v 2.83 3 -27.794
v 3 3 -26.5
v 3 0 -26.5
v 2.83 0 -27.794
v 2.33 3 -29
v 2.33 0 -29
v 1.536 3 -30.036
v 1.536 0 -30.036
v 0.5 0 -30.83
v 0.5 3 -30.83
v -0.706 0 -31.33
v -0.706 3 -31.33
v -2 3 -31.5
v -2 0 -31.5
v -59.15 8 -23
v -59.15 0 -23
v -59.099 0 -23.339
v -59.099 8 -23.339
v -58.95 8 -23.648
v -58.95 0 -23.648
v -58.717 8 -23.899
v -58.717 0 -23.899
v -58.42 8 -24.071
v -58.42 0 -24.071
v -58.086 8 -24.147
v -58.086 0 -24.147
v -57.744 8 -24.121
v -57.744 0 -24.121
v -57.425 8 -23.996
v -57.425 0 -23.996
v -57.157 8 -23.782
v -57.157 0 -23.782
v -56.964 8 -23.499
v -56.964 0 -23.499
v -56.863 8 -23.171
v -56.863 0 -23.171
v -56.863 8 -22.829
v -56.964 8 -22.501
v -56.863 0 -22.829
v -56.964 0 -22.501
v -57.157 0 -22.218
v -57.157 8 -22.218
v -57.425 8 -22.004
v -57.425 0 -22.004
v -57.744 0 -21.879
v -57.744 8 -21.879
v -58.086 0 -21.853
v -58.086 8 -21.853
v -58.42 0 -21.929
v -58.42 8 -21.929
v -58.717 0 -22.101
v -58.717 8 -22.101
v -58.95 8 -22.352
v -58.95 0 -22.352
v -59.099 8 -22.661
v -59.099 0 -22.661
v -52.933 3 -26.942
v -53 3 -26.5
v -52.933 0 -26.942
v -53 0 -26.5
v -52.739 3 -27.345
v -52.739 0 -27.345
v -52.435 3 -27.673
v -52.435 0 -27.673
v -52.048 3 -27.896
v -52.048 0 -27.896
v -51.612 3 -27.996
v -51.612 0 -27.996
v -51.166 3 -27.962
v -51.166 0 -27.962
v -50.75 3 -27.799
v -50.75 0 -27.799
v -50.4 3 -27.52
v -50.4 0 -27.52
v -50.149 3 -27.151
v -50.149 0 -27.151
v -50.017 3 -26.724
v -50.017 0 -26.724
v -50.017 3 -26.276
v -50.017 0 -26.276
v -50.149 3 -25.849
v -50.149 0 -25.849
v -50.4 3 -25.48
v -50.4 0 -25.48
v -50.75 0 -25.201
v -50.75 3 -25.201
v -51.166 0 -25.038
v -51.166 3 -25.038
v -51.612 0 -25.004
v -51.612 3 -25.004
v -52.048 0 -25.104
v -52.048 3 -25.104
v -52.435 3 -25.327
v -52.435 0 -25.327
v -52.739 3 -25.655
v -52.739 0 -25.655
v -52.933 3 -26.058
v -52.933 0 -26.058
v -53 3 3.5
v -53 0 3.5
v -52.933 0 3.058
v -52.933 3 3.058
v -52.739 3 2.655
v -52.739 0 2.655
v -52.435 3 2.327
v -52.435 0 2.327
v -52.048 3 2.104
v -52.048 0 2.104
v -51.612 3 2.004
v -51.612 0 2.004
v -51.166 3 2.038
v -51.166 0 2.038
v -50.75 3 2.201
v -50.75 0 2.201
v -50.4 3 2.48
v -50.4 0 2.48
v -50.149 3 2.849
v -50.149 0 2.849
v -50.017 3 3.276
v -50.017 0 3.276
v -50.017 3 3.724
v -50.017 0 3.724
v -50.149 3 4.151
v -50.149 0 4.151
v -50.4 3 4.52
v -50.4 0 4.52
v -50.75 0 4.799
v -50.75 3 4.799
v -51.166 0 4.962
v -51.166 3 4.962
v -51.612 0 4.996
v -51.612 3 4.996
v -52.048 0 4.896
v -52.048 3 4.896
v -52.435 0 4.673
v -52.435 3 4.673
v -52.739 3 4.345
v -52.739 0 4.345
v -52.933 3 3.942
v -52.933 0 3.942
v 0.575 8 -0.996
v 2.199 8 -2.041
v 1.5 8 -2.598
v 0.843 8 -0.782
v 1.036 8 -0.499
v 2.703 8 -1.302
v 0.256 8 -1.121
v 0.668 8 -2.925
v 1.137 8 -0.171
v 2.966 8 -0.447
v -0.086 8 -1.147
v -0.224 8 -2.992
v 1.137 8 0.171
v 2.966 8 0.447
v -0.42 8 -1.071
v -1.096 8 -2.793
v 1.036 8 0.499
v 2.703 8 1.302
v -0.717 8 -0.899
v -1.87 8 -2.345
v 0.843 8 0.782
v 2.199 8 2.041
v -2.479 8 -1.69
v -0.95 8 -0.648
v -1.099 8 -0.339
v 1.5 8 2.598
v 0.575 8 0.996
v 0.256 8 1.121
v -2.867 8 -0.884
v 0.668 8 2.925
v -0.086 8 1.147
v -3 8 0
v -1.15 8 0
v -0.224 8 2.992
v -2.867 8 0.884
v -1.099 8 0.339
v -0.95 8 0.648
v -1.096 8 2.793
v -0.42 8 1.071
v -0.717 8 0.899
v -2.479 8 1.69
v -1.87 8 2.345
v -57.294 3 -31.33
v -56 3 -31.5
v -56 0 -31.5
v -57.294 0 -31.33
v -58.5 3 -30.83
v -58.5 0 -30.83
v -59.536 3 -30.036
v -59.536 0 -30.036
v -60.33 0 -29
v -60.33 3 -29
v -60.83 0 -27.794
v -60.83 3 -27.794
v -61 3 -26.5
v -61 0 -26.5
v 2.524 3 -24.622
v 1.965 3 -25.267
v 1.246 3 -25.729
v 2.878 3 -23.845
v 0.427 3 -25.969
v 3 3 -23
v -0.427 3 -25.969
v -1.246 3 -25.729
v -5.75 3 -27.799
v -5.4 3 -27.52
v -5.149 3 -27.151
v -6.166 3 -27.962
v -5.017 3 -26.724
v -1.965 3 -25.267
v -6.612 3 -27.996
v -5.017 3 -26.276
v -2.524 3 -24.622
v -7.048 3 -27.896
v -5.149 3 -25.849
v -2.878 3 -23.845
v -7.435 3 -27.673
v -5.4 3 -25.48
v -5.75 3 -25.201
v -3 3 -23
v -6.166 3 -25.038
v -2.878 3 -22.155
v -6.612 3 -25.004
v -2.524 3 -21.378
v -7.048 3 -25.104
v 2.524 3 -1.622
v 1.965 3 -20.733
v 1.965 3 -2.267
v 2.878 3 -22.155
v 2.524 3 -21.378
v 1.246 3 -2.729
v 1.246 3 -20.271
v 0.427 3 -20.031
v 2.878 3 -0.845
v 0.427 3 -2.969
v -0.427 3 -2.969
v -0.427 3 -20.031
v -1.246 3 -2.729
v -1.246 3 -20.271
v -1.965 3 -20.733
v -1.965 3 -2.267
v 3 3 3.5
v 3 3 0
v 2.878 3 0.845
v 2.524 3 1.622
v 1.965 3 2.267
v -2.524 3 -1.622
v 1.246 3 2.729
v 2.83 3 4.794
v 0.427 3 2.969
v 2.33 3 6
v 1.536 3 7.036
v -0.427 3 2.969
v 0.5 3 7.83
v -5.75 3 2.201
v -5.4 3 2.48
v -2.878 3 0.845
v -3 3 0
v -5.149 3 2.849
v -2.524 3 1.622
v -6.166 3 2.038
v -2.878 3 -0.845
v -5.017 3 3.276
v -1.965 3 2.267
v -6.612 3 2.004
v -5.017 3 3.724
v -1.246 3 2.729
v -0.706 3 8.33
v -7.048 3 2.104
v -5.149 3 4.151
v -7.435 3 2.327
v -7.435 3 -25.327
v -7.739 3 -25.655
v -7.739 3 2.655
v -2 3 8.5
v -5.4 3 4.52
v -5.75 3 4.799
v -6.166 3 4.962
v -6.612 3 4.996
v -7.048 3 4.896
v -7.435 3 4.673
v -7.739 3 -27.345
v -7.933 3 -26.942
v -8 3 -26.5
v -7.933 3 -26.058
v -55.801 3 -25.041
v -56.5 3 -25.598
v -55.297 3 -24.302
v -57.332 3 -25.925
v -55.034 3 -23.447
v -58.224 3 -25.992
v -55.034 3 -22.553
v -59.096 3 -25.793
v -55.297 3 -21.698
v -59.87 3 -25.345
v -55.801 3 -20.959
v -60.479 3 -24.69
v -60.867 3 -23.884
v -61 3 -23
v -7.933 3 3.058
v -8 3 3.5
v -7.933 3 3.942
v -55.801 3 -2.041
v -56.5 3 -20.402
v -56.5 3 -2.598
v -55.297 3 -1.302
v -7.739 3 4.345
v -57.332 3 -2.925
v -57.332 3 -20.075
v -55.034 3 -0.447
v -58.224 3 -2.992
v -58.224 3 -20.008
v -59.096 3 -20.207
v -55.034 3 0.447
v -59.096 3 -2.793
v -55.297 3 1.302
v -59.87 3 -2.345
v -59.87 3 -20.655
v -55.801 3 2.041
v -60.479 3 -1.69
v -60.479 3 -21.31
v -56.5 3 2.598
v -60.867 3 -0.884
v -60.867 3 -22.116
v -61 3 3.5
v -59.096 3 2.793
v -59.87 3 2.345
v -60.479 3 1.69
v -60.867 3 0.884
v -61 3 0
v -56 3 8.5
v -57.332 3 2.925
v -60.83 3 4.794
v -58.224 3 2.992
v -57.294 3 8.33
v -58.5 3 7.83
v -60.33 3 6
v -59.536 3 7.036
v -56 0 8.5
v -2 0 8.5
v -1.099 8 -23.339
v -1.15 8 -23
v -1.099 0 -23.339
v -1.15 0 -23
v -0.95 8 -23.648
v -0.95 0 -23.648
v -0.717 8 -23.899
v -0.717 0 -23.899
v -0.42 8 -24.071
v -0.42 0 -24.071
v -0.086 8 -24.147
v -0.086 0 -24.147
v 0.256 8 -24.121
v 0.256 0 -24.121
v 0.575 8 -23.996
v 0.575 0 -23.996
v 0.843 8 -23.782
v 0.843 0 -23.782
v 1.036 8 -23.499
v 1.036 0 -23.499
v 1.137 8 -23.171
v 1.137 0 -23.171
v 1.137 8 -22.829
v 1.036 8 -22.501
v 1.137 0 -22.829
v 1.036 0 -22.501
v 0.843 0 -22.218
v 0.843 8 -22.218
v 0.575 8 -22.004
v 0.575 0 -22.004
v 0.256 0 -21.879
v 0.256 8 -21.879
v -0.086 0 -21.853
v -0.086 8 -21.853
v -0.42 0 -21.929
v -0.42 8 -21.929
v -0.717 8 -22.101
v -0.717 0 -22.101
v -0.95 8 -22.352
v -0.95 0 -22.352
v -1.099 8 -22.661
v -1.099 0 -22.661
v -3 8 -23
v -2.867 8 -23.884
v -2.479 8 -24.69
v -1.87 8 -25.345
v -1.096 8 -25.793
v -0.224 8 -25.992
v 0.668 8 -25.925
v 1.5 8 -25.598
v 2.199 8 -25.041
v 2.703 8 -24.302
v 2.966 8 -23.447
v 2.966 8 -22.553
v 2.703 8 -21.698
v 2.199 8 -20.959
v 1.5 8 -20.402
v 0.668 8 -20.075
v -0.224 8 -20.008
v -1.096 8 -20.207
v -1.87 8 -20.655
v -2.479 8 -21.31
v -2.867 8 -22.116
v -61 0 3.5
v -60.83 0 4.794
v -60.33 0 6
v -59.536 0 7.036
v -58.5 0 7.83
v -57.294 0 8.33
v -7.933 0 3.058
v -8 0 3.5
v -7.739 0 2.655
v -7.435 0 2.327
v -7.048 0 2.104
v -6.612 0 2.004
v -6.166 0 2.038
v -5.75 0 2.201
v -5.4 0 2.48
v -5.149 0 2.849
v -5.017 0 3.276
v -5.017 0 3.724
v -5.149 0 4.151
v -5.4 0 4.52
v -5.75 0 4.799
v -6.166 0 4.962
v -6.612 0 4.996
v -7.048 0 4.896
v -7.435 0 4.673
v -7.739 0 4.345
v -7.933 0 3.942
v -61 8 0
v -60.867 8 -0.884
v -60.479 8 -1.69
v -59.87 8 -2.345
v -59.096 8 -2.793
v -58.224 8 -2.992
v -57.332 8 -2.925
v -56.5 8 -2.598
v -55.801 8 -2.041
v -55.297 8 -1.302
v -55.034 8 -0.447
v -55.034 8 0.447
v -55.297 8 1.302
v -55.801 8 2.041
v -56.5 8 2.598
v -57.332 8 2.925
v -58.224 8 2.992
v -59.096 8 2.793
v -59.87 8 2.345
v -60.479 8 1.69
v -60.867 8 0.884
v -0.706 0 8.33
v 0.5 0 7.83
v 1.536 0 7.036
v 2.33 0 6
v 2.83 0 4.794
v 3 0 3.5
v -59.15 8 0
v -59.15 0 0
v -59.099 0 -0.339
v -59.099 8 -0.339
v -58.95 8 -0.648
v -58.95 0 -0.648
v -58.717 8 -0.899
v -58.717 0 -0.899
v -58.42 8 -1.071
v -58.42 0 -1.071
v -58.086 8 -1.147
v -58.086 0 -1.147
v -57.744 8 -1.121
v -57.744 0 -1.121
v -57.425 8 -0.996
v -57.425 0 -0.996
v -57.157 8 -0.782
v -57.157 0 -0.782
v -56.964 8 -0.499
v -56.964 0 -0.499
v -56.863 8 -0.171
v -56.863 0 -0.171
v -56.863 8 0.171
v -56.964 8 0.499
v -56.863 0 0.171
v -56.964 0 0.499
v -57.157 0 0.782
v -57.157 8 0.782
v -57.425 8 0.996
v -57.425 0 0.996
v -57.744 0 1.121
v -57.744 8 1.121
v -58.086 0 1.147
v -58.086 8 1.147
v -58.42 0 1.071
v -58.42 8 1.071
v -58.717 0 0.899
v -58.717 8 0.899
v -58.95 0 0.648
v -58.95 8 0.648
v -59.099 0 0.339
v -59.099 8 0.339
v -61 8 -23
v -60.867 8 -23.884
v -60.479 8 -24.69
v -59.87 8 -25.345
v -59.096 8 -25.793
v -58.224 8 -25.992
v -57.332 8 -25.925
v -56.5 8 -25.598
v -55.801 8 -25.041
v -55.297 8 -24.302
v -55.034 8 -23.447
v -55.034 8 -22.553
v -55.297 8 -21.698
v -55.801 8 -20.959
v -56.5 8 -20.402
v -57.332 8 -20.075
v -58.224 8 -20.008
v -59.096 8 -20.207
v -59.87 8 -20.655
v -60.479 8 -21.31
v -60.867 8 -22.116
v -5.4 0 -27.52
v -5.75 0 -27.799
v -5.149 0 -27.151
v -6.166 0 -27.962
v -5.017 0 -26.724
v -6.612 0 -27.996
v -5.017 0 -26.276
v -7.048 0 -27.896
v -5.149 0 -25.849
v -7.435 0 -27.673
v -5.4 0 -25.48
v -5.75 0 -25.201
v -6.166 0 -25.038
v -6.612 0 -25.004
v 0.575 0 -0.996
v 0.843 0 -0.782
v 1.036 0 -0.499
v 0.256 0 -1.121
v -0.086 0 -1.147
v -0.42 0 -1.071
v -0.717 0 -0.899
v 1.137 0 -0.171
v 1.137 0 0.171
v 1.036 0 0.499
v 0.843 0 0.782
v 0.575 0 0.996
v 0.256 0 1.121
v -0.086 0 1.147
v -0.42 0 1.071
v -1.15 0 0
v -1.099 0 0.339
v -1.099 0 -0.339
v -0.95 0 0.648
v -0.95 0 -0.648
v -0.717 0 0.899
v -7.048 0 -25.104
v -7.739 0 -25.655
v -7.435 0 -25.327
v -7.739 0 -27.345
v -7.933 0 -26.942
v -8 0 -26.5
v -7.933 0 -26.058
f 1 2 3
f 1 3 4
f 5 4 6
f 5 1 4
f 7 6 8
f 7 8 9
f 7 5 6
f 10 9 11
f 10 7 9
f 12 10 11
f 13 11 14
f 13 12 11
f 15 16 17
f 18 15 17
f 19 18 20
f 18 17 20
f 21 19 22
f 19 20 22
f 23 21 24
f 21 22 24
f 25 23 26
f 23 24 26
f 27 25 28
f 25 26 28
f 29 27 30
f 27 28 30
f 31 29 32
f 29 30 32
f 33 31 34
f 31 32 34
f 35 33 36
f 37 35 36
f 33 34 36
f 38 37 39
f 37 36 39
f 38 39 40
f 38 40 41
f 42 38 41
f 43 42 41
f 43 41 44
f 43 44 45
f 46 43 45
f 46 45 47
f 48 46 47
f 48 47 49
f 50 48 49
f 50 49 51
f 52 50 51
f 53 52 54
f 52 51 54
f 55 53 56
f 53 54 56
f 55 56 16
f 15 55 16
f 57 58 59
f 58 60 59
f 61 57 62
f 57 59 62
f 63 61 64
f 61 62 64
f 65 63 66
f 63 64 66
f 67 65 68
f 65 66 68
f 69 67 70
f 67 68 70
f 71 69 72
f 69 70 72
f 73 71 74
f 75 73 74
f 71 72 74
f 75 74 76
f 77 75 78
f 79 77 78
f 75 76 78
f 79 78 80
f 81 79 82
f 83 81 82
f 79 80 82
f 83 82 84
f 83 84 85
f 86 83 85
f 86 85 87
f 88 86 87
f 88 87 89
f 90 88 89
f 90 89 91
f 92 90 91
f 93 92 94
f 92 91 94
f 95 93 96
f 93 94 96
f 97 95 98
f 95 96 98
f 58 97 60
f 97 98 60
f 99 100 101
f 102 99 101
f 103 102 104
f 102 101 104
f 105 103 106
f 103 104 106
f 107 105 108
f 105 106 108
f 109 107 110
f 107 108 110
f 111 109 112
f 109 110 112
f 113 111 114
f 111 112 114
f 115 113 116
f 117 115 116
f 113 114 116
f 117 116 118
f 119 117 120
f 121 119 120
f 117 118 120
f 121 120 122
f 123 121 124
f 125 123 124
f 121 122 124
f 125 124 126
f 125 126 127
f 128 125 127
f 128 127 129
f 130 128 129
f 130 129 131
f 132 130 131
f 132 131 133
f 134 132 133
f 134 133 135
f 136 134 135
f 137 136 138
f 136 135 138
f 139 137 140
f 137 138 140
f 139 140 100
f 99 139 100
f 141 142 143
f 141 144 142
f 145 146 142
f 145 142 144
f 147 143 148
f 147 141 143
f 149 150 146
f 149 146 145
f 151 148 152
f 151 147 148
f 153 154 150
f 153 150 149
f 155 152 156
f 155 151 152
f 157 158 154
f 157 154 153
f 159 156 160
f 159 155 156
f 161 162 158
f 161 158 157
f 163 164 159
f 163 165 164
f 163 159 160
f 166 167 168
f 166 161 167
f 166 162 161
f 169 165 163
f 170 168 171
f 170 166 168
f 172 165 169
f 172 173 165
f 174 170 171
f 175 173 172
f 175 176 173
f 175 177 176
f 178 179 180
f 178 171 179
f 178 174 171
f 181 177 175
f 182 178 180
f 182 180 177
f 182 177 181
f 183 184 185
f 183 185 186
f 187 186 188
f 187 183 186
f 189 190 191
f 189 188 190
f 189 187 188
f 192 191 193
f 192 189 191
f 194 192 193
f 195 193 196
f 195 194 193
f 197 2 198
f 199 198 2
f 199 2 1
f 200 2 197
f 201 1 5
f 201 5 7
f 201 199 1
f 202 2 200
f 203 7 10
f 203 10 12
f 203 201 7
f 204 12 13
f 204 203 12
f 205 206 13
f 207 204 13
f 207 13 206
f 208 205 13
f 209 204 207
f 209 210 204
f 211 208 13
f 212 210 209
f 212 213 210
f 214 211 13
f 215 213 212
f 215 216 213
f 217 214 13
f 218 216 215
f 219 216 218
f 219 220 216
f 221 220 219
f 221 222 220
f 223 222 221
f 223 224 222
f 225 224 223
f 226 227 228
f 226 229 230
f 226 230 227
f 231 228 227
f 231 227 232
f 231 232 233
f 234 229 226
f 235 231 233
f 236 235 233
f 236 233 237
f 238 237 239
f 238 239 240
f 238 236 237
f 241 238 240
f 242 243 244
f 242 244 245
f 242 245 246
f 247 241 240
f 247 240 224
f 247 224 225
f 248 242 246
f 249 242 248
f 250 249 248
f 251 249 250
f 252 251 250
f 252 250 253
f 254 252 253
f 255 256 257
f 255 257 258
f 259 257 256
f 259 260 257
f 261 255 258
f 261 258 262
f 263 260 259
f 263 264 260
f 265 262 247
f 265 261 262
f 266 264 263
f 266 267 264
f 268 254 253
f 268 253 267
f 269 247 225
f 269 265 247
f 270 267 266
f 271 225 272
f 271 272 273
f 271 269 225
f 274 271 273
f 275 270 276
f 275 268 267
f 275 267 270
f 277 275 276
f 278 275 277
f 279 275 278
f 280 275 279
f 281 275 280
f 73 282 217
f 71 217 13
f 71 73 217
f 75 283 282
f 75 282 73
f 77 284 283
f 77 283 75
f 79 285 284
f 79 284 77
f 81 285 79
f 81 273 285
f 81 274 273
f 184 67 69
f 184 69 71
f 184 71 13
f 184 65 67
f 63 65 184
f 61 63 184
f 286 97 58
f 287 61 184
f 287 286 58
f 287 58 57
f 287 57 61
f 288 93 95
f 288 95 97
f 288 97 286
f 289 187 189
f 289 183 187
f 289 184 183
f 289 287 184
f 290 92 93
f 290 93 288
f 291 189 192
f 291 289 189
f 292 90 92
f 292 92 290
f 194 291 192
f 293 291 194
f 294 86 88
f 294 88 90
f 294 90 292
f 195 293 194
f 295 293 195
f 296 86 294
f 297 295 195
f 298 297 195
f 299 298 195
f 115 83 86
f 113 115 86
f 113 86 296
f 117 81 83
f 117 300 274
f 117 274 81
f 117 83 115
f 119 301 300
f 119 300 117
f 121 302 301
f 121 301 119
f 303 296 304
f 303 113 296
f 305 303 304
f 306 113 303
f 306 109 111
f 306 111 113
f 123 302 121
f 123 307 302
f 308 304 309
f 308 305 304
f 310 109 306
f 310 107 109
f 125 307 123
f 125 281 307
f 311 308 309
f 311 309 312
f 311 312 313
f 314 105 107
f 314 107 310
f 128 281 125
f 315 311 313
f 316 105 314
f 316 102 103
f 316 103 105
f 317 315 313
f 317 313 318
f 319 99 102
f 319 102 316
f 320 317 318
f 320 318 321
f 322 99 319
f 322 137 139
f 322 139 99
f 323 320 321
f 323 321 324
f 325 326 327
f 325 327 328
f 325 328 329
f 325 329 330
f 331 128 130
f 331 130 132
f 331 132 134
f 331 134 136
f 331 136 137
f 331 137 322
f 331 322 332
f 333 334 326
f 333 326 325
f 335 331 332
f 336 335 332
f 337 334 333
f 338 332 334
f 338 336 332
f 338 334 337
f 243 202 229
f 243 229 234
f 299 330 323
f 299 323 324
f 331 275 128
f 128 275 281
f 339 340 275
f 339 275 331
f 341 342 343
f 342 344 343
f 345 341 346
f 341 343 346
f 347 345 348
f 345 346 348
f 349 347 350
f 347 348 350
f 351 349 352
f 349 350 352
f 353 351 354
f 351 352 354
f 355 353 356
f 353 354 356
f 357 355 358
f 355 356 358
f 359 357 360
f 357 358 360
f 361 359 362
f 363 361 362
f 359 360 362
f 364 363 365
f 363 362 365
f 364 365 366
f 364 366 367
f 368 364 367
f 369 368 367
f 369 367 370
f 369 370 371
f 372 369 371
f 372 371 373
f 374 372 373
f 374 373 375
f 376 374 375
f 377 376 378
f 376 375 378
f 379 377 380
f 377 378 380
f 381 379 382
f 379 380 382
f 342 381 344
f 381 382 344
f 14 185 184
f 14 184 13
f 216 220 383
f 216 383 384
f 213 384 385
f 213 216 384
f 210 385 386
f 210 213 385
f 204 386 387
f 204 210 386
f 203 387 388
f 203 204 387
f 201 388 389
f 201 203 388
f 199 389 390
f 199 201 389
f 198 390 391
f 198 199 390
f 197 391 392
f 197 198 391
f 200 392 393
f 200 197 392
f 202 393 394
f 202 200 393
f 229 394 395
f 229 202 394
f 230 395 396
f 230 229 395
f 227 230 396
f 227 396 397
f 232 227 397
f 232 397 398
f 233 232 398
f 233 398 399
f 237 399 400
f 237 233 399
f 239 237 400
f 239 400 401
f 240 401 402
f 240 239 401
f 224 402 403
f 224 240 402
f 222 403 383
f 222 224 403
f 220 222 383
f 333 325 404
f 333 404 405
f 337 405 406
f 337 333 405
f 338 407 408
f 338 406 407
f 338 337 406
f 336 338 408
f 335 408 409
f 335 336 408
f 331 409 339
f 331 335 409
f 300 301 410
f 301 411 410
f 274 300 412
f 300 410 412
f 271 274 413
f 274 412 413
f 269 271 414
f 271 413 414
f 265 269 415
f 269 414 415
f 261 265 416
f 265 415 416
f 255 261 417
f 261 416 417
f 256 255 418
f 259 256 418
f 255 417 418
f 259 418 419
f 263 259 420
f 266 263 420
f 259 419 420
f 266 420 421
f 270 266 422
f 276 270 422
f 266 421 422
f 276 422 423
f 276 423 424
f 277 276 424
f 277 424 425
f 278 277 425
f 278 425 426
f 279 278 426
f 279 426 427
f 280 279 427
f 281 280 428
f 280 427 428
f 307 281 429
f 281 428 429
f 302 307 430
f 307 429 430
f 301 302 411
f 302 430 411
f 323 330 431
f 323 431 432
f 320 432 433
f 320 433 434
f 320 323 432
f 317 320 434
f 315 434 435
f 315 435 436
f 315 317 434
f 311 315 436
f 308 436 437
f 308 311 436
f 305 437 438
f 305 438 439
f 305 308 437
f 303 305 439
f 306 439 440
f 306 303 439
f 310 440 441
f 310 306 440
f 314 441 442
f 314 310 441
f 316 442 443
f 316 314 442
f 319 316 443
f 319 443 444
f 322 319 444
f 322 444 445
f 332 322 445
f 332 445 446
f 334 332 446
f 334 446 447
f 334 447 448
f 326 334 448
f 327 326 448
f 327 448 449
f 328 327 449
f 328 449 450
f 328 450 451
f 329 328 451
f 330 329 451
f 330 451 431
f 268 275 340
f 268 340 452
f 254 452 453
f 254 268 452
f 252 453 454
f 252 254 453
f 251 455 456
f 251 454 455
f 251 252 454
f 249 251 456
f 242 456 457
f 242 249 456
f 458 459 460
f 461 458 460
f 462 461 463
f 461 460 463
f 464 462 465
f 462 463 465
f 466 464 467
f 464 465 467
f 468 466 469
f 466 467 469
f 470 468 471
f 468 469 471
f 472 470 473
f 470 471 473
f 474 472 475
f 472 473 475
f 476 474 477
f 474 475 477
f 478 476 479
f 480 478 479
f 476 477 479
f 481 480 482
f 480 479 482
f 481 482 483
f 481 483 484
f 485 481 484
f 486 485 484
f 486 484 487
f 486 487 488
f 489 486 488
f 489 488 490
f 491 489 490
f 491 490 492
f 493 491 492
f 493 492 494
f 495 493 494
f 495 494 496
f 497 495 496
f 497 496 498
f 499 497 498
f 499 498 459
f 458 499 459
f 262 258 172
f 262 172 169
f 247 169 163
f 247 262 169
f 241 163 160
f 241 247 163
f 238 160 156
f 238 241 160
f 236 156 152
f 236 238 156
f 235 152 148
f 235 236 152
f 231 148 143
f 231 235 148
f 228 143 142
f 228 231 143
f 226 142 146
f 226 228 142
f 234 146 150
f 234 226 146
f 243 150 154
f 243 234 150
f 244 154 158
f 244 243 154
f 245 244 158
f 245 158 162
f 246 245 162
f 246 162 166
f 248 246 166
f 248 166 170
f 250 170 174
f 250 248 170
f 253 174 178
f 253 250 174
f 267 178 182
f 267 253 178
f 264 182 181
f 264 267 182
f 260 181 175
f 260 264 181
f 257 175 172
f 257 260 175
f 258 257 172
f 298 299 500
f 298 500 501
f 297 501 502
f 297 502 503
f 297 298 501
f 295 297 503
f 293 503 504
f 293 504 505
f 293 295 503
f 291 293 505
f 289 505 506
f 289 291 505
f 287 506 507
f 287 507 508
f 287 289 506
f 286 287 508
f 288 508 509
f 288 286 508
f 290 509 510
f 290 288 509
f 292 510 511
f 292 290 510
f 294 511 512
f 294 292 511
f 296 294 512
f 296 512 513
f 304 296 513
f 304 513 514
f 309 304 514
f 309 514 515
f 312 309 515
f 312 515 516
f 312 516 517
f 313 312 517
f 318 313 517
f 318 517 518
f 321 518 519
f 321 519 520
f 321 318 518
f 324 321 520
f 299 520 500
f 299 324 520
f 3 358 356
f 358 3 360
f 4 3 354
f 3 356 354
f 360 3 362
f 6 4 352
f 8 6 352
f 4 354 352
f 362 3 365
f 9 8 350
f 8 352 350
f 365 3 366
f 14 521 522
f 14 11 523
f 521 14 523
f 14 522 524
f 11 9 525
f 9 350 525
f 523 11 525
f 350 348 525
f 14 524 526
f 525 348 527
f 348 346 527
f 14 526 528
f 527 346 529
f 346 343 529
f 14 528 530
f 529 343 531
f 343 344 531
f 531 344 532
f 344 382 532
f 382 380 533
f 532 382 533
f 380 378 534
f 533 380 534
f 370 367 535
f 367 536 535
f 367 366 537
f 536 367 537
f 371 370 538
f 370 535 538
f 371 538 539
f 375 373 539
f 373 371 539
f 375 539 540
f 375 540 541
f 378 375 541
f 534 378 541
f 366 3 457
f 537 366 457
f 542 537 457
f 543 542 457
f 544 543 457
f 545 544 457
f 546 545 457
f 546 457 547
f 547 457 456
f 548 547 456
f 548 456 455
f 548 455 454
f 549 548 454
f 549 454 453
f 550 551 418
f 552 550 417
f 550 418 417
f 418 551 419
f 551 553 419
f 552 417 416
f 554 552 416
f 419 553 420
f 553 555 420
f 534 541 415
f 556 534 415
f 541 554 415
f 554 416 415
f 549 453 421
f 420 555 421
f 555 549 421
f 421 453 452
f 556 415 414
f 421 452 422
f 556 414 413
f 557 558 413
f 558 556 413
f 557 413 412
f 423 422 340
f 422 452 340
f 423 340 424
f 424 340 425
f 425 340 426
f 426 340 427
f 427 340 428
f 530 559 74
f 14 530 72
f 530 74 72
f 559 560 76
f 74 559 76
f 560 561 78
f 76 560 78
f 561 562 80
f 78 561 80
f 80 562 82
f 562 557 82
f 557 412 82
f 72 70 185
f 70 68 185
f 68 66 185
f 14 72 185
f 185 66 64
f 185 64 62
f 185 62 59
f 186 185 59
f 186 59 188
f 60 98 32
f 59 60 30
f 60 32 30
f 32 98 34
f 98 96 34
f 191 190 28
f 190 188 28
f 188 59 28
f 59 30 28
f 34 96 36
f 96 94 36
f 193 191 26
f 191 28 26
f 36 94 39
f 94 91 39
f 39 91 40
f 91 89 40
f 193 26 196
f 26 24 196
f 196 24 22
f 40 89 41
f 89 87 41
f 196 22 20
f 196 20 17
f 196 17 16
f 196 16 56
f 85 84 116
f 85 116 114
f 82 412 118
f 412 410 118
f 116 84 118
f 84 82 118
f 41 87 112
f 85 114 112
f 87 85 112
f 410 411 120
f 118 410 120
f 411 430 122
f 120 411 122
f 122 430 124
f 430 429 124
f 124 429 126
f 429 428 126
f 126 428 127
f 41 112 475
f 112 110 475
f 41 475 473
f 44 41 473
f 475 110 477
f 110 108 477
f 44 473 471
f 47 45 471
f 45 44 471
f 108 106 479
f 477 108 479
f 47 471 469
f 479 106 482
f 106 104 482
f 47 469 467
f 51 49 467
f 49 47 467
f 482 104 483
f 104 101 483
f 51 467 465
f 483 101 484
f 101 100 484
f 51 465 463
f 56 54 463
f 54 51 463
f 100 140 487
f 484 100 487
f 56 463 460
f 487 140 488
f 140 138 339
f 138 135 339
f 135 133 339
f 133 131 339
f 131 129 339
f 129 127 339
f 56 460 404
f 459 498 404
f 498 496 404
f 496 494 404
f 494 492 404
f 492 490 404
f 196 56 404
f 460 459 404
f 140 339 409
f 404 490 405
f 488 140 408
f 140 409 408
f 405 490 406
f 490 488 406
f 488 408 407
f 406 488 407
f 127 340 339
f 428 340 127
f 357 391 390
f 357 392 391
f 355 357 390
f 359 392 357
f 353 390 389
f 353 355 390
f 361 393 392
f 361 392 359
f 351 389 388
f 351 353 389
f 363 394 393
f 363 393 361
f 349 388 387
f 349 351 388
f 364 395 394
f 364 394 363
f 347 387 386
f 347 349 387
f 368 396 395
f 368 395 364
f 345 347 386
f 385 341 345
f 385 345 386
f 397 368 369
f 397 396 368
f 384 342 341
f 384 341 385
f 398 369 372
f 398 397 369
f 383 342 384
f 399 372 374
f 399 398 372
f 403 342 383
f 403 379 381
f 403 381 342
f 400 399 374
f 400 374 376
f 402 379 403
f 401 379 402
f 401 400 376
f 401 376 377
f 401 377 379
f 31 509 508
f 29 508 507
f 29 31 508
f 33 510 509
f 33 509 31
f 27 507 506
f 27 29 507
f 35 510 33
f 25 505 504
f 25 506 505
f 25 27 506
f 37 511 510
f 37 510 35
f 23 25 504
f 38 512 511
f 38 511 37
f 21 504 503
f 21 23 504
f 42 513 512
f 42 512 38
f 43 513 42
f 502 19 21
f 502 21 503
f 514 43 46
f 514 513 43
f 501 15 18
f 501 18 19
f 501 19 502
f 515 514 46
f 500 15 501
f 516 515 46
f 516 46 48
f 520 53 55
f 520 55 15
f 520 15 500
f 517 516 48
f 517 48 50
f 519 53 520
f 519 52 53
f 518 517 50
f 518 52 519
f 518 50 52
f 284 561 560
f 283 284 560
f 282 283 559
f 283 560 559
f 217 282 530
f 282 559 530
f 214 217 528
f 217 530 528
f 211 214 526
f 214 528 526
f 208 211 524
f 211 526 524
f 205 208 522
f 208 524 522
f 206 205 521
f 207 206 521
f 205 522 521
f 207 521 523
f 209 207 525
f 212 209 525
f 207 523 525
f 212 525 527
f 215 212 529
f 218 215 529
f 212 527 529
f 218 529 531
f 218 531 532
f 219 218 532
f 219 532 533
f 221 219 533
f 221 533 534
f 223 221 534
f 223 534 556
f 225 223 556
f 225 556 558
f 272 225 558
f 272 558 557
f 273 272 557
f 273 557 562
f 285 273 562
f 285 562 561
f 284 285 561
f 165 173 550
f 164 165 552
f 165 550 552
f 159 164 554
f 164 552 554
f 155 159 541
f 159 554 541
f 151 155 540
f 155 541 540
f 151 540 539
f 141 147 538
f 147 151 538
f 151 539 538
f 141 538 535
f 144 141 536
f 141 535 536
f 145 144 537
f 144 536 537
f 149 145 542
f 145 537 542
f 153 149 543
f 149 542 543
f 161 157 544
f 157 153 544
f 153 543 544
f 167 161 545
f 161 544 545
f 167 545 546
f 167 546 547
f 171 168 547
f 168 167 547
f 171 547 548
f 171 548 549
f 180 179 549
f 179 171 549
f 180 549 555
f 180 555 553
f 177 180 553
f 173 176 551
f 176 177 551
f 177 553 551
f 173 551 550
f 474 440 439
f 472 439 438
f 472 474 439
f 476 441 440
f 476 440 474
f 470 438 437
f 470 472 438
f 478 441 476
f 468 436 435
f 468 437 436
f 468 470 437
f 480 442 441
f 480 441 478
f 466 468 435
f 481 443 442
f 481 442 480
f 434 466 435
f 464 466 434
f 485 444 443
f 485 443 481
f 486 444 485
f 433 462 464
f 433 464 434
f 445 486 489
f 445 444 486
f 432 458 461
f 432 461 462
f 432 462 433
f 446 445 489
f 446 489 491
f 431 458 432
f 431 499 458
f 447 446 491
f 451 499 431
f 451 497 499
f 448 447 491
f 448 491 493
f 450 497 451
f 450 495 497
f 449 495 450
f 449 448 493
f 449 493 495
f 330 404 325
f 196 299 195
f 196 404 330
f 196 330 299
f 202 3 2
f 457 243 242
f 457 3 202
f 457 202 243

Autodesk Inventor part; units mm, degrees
ref_plane "YZ Plane" through (0, 0, 0) normal (1, 0, 0) x (0, 1, 0)
ref_plane "XZ Plane" through (0, 0, 0) normal (0, 1, 0) x (-1, 0, 0)
ref_plane "XY Plane" through (0, 0, 0) normal (0, 0, 1) x (1, 0, 0)
sketch "Sketch1" plane through (0, 0, 0) normal (0, 1, 0) x (-1, 0, 0)
  line L0 (0, 0) -> (58, 0)
  line L1 (58, 0) -> (58, -23)
  line L2 (58, -23) -> (0, -23)
  line L3 (0, -23) -> (0, 0)
  line L4 (6.5, 3.5) -> (51.5, 3.5)
  line L5 (51.5, 3.5) -> (51.5, -26.5)
  line L6 (51.5, -26.5) -> (6.5, -26.5)
  line L7 (6.5, -26.5) -> (6.5, 3.5)
  circle A0 centre (51.5, 3.5) radius 1.5
  circle A1 centre (51.5, -26.5) radius 1.5
  circle A2 centre (6.5, -26.5) radius 1.5
  circle A3 centre (6.5, 3.5) radius 1.5
  line L8 (-3, 8.5) -> (61, 8.5)
  line L9 (61, 8.5) -> (61, -31.5)
  line L10 (61, -31.5) -> (-3, -31.5)
  line L11 (-3, -31.5) -> (-3, 8.5)
  circle A4 centre (58, 0) radius 1.15
  circle A5 centre (58, -23) radius 1.15
  circle A6 centre (0, 0) radius 1.15
  circle A7 centre (0, -23) radius 1.15
  circle A8 centre (58, 0) radius 3
  circle A9 centre (58, -23) radius 3
  circle A10 centre (0, 0) radius 3
  circle A11 centre (0, -23) radius 3
  dimension "d0" = 23
  dimension "d1" = 58
  dimension "d2" = 45
  dimension "d3" = 30
  dimension "d4" = 3.5
  dimension "d6" = 3
  dimension "d7" = 3
  dimension "d8" = 3
  dimension "d9" = 3
  dimension "d10" = 9.5
  dimension "d11" = 5
  dimension "d12" = 5
  dimension "d13" = 9.5
  dimension "d14" = 2.3
  dimension "d15" = 2.3
  dimension "d16" = 2.3
  dimension "d17" = 2.3
  dimension "d18" = 6
  dimension "d19" = 6
  dimension "d20" = 6
  dimension "d21" = 6
  dimension "d28" = 6.5
extrude "Extrusion1" add sketch "Sketch1" along normal blind 3 contours A6 L3 A10 L0 | L0 A10 L3 A6 | A10 L11 L8 L9 A8 L0 L5 A0 L4 A3 L7 | L0 L7 L2 A11 L3 A10 | L3 A11 L11 A10 | L7 A3 L4 A0 L5 L0 | L0 L5 L2 L7 | A11 L2 A7 L3 | L3 A7 L2 A11 | L0 A8 L1 A9 L2 L5 | L7 A2 L6 A1 L5 L2 A9 L9 L10 L11 A11 | L2 L5 A1 L6 A2 L7 | A8 L1 A4 L0 | L0 A4 L1 A8 | L9 A9 L1 A8 | A9 L1 A5 L2 | L2 A5 L1 A9
extrude "Extrusion2" add sketch "Sketch1" along normal blind 8 contours A6 L3 A10 L0 | L0 A10 L3 A6 | A11 L2 A7 L3 | L3 A7 L2 A11 | A8 L1 A4 L0 | L0 A4 L1 A8 | A9 L1 A5 L2 | L2 A5 L1 A9
fillet "Fillet1" radius 5 4 edges at (-61, 1.5, 8.5) (3, 1.5, 8.5) (3, 1.5, -31.5) (-61, 1.5, -31.5)
properties part number "RaspberryMount"
